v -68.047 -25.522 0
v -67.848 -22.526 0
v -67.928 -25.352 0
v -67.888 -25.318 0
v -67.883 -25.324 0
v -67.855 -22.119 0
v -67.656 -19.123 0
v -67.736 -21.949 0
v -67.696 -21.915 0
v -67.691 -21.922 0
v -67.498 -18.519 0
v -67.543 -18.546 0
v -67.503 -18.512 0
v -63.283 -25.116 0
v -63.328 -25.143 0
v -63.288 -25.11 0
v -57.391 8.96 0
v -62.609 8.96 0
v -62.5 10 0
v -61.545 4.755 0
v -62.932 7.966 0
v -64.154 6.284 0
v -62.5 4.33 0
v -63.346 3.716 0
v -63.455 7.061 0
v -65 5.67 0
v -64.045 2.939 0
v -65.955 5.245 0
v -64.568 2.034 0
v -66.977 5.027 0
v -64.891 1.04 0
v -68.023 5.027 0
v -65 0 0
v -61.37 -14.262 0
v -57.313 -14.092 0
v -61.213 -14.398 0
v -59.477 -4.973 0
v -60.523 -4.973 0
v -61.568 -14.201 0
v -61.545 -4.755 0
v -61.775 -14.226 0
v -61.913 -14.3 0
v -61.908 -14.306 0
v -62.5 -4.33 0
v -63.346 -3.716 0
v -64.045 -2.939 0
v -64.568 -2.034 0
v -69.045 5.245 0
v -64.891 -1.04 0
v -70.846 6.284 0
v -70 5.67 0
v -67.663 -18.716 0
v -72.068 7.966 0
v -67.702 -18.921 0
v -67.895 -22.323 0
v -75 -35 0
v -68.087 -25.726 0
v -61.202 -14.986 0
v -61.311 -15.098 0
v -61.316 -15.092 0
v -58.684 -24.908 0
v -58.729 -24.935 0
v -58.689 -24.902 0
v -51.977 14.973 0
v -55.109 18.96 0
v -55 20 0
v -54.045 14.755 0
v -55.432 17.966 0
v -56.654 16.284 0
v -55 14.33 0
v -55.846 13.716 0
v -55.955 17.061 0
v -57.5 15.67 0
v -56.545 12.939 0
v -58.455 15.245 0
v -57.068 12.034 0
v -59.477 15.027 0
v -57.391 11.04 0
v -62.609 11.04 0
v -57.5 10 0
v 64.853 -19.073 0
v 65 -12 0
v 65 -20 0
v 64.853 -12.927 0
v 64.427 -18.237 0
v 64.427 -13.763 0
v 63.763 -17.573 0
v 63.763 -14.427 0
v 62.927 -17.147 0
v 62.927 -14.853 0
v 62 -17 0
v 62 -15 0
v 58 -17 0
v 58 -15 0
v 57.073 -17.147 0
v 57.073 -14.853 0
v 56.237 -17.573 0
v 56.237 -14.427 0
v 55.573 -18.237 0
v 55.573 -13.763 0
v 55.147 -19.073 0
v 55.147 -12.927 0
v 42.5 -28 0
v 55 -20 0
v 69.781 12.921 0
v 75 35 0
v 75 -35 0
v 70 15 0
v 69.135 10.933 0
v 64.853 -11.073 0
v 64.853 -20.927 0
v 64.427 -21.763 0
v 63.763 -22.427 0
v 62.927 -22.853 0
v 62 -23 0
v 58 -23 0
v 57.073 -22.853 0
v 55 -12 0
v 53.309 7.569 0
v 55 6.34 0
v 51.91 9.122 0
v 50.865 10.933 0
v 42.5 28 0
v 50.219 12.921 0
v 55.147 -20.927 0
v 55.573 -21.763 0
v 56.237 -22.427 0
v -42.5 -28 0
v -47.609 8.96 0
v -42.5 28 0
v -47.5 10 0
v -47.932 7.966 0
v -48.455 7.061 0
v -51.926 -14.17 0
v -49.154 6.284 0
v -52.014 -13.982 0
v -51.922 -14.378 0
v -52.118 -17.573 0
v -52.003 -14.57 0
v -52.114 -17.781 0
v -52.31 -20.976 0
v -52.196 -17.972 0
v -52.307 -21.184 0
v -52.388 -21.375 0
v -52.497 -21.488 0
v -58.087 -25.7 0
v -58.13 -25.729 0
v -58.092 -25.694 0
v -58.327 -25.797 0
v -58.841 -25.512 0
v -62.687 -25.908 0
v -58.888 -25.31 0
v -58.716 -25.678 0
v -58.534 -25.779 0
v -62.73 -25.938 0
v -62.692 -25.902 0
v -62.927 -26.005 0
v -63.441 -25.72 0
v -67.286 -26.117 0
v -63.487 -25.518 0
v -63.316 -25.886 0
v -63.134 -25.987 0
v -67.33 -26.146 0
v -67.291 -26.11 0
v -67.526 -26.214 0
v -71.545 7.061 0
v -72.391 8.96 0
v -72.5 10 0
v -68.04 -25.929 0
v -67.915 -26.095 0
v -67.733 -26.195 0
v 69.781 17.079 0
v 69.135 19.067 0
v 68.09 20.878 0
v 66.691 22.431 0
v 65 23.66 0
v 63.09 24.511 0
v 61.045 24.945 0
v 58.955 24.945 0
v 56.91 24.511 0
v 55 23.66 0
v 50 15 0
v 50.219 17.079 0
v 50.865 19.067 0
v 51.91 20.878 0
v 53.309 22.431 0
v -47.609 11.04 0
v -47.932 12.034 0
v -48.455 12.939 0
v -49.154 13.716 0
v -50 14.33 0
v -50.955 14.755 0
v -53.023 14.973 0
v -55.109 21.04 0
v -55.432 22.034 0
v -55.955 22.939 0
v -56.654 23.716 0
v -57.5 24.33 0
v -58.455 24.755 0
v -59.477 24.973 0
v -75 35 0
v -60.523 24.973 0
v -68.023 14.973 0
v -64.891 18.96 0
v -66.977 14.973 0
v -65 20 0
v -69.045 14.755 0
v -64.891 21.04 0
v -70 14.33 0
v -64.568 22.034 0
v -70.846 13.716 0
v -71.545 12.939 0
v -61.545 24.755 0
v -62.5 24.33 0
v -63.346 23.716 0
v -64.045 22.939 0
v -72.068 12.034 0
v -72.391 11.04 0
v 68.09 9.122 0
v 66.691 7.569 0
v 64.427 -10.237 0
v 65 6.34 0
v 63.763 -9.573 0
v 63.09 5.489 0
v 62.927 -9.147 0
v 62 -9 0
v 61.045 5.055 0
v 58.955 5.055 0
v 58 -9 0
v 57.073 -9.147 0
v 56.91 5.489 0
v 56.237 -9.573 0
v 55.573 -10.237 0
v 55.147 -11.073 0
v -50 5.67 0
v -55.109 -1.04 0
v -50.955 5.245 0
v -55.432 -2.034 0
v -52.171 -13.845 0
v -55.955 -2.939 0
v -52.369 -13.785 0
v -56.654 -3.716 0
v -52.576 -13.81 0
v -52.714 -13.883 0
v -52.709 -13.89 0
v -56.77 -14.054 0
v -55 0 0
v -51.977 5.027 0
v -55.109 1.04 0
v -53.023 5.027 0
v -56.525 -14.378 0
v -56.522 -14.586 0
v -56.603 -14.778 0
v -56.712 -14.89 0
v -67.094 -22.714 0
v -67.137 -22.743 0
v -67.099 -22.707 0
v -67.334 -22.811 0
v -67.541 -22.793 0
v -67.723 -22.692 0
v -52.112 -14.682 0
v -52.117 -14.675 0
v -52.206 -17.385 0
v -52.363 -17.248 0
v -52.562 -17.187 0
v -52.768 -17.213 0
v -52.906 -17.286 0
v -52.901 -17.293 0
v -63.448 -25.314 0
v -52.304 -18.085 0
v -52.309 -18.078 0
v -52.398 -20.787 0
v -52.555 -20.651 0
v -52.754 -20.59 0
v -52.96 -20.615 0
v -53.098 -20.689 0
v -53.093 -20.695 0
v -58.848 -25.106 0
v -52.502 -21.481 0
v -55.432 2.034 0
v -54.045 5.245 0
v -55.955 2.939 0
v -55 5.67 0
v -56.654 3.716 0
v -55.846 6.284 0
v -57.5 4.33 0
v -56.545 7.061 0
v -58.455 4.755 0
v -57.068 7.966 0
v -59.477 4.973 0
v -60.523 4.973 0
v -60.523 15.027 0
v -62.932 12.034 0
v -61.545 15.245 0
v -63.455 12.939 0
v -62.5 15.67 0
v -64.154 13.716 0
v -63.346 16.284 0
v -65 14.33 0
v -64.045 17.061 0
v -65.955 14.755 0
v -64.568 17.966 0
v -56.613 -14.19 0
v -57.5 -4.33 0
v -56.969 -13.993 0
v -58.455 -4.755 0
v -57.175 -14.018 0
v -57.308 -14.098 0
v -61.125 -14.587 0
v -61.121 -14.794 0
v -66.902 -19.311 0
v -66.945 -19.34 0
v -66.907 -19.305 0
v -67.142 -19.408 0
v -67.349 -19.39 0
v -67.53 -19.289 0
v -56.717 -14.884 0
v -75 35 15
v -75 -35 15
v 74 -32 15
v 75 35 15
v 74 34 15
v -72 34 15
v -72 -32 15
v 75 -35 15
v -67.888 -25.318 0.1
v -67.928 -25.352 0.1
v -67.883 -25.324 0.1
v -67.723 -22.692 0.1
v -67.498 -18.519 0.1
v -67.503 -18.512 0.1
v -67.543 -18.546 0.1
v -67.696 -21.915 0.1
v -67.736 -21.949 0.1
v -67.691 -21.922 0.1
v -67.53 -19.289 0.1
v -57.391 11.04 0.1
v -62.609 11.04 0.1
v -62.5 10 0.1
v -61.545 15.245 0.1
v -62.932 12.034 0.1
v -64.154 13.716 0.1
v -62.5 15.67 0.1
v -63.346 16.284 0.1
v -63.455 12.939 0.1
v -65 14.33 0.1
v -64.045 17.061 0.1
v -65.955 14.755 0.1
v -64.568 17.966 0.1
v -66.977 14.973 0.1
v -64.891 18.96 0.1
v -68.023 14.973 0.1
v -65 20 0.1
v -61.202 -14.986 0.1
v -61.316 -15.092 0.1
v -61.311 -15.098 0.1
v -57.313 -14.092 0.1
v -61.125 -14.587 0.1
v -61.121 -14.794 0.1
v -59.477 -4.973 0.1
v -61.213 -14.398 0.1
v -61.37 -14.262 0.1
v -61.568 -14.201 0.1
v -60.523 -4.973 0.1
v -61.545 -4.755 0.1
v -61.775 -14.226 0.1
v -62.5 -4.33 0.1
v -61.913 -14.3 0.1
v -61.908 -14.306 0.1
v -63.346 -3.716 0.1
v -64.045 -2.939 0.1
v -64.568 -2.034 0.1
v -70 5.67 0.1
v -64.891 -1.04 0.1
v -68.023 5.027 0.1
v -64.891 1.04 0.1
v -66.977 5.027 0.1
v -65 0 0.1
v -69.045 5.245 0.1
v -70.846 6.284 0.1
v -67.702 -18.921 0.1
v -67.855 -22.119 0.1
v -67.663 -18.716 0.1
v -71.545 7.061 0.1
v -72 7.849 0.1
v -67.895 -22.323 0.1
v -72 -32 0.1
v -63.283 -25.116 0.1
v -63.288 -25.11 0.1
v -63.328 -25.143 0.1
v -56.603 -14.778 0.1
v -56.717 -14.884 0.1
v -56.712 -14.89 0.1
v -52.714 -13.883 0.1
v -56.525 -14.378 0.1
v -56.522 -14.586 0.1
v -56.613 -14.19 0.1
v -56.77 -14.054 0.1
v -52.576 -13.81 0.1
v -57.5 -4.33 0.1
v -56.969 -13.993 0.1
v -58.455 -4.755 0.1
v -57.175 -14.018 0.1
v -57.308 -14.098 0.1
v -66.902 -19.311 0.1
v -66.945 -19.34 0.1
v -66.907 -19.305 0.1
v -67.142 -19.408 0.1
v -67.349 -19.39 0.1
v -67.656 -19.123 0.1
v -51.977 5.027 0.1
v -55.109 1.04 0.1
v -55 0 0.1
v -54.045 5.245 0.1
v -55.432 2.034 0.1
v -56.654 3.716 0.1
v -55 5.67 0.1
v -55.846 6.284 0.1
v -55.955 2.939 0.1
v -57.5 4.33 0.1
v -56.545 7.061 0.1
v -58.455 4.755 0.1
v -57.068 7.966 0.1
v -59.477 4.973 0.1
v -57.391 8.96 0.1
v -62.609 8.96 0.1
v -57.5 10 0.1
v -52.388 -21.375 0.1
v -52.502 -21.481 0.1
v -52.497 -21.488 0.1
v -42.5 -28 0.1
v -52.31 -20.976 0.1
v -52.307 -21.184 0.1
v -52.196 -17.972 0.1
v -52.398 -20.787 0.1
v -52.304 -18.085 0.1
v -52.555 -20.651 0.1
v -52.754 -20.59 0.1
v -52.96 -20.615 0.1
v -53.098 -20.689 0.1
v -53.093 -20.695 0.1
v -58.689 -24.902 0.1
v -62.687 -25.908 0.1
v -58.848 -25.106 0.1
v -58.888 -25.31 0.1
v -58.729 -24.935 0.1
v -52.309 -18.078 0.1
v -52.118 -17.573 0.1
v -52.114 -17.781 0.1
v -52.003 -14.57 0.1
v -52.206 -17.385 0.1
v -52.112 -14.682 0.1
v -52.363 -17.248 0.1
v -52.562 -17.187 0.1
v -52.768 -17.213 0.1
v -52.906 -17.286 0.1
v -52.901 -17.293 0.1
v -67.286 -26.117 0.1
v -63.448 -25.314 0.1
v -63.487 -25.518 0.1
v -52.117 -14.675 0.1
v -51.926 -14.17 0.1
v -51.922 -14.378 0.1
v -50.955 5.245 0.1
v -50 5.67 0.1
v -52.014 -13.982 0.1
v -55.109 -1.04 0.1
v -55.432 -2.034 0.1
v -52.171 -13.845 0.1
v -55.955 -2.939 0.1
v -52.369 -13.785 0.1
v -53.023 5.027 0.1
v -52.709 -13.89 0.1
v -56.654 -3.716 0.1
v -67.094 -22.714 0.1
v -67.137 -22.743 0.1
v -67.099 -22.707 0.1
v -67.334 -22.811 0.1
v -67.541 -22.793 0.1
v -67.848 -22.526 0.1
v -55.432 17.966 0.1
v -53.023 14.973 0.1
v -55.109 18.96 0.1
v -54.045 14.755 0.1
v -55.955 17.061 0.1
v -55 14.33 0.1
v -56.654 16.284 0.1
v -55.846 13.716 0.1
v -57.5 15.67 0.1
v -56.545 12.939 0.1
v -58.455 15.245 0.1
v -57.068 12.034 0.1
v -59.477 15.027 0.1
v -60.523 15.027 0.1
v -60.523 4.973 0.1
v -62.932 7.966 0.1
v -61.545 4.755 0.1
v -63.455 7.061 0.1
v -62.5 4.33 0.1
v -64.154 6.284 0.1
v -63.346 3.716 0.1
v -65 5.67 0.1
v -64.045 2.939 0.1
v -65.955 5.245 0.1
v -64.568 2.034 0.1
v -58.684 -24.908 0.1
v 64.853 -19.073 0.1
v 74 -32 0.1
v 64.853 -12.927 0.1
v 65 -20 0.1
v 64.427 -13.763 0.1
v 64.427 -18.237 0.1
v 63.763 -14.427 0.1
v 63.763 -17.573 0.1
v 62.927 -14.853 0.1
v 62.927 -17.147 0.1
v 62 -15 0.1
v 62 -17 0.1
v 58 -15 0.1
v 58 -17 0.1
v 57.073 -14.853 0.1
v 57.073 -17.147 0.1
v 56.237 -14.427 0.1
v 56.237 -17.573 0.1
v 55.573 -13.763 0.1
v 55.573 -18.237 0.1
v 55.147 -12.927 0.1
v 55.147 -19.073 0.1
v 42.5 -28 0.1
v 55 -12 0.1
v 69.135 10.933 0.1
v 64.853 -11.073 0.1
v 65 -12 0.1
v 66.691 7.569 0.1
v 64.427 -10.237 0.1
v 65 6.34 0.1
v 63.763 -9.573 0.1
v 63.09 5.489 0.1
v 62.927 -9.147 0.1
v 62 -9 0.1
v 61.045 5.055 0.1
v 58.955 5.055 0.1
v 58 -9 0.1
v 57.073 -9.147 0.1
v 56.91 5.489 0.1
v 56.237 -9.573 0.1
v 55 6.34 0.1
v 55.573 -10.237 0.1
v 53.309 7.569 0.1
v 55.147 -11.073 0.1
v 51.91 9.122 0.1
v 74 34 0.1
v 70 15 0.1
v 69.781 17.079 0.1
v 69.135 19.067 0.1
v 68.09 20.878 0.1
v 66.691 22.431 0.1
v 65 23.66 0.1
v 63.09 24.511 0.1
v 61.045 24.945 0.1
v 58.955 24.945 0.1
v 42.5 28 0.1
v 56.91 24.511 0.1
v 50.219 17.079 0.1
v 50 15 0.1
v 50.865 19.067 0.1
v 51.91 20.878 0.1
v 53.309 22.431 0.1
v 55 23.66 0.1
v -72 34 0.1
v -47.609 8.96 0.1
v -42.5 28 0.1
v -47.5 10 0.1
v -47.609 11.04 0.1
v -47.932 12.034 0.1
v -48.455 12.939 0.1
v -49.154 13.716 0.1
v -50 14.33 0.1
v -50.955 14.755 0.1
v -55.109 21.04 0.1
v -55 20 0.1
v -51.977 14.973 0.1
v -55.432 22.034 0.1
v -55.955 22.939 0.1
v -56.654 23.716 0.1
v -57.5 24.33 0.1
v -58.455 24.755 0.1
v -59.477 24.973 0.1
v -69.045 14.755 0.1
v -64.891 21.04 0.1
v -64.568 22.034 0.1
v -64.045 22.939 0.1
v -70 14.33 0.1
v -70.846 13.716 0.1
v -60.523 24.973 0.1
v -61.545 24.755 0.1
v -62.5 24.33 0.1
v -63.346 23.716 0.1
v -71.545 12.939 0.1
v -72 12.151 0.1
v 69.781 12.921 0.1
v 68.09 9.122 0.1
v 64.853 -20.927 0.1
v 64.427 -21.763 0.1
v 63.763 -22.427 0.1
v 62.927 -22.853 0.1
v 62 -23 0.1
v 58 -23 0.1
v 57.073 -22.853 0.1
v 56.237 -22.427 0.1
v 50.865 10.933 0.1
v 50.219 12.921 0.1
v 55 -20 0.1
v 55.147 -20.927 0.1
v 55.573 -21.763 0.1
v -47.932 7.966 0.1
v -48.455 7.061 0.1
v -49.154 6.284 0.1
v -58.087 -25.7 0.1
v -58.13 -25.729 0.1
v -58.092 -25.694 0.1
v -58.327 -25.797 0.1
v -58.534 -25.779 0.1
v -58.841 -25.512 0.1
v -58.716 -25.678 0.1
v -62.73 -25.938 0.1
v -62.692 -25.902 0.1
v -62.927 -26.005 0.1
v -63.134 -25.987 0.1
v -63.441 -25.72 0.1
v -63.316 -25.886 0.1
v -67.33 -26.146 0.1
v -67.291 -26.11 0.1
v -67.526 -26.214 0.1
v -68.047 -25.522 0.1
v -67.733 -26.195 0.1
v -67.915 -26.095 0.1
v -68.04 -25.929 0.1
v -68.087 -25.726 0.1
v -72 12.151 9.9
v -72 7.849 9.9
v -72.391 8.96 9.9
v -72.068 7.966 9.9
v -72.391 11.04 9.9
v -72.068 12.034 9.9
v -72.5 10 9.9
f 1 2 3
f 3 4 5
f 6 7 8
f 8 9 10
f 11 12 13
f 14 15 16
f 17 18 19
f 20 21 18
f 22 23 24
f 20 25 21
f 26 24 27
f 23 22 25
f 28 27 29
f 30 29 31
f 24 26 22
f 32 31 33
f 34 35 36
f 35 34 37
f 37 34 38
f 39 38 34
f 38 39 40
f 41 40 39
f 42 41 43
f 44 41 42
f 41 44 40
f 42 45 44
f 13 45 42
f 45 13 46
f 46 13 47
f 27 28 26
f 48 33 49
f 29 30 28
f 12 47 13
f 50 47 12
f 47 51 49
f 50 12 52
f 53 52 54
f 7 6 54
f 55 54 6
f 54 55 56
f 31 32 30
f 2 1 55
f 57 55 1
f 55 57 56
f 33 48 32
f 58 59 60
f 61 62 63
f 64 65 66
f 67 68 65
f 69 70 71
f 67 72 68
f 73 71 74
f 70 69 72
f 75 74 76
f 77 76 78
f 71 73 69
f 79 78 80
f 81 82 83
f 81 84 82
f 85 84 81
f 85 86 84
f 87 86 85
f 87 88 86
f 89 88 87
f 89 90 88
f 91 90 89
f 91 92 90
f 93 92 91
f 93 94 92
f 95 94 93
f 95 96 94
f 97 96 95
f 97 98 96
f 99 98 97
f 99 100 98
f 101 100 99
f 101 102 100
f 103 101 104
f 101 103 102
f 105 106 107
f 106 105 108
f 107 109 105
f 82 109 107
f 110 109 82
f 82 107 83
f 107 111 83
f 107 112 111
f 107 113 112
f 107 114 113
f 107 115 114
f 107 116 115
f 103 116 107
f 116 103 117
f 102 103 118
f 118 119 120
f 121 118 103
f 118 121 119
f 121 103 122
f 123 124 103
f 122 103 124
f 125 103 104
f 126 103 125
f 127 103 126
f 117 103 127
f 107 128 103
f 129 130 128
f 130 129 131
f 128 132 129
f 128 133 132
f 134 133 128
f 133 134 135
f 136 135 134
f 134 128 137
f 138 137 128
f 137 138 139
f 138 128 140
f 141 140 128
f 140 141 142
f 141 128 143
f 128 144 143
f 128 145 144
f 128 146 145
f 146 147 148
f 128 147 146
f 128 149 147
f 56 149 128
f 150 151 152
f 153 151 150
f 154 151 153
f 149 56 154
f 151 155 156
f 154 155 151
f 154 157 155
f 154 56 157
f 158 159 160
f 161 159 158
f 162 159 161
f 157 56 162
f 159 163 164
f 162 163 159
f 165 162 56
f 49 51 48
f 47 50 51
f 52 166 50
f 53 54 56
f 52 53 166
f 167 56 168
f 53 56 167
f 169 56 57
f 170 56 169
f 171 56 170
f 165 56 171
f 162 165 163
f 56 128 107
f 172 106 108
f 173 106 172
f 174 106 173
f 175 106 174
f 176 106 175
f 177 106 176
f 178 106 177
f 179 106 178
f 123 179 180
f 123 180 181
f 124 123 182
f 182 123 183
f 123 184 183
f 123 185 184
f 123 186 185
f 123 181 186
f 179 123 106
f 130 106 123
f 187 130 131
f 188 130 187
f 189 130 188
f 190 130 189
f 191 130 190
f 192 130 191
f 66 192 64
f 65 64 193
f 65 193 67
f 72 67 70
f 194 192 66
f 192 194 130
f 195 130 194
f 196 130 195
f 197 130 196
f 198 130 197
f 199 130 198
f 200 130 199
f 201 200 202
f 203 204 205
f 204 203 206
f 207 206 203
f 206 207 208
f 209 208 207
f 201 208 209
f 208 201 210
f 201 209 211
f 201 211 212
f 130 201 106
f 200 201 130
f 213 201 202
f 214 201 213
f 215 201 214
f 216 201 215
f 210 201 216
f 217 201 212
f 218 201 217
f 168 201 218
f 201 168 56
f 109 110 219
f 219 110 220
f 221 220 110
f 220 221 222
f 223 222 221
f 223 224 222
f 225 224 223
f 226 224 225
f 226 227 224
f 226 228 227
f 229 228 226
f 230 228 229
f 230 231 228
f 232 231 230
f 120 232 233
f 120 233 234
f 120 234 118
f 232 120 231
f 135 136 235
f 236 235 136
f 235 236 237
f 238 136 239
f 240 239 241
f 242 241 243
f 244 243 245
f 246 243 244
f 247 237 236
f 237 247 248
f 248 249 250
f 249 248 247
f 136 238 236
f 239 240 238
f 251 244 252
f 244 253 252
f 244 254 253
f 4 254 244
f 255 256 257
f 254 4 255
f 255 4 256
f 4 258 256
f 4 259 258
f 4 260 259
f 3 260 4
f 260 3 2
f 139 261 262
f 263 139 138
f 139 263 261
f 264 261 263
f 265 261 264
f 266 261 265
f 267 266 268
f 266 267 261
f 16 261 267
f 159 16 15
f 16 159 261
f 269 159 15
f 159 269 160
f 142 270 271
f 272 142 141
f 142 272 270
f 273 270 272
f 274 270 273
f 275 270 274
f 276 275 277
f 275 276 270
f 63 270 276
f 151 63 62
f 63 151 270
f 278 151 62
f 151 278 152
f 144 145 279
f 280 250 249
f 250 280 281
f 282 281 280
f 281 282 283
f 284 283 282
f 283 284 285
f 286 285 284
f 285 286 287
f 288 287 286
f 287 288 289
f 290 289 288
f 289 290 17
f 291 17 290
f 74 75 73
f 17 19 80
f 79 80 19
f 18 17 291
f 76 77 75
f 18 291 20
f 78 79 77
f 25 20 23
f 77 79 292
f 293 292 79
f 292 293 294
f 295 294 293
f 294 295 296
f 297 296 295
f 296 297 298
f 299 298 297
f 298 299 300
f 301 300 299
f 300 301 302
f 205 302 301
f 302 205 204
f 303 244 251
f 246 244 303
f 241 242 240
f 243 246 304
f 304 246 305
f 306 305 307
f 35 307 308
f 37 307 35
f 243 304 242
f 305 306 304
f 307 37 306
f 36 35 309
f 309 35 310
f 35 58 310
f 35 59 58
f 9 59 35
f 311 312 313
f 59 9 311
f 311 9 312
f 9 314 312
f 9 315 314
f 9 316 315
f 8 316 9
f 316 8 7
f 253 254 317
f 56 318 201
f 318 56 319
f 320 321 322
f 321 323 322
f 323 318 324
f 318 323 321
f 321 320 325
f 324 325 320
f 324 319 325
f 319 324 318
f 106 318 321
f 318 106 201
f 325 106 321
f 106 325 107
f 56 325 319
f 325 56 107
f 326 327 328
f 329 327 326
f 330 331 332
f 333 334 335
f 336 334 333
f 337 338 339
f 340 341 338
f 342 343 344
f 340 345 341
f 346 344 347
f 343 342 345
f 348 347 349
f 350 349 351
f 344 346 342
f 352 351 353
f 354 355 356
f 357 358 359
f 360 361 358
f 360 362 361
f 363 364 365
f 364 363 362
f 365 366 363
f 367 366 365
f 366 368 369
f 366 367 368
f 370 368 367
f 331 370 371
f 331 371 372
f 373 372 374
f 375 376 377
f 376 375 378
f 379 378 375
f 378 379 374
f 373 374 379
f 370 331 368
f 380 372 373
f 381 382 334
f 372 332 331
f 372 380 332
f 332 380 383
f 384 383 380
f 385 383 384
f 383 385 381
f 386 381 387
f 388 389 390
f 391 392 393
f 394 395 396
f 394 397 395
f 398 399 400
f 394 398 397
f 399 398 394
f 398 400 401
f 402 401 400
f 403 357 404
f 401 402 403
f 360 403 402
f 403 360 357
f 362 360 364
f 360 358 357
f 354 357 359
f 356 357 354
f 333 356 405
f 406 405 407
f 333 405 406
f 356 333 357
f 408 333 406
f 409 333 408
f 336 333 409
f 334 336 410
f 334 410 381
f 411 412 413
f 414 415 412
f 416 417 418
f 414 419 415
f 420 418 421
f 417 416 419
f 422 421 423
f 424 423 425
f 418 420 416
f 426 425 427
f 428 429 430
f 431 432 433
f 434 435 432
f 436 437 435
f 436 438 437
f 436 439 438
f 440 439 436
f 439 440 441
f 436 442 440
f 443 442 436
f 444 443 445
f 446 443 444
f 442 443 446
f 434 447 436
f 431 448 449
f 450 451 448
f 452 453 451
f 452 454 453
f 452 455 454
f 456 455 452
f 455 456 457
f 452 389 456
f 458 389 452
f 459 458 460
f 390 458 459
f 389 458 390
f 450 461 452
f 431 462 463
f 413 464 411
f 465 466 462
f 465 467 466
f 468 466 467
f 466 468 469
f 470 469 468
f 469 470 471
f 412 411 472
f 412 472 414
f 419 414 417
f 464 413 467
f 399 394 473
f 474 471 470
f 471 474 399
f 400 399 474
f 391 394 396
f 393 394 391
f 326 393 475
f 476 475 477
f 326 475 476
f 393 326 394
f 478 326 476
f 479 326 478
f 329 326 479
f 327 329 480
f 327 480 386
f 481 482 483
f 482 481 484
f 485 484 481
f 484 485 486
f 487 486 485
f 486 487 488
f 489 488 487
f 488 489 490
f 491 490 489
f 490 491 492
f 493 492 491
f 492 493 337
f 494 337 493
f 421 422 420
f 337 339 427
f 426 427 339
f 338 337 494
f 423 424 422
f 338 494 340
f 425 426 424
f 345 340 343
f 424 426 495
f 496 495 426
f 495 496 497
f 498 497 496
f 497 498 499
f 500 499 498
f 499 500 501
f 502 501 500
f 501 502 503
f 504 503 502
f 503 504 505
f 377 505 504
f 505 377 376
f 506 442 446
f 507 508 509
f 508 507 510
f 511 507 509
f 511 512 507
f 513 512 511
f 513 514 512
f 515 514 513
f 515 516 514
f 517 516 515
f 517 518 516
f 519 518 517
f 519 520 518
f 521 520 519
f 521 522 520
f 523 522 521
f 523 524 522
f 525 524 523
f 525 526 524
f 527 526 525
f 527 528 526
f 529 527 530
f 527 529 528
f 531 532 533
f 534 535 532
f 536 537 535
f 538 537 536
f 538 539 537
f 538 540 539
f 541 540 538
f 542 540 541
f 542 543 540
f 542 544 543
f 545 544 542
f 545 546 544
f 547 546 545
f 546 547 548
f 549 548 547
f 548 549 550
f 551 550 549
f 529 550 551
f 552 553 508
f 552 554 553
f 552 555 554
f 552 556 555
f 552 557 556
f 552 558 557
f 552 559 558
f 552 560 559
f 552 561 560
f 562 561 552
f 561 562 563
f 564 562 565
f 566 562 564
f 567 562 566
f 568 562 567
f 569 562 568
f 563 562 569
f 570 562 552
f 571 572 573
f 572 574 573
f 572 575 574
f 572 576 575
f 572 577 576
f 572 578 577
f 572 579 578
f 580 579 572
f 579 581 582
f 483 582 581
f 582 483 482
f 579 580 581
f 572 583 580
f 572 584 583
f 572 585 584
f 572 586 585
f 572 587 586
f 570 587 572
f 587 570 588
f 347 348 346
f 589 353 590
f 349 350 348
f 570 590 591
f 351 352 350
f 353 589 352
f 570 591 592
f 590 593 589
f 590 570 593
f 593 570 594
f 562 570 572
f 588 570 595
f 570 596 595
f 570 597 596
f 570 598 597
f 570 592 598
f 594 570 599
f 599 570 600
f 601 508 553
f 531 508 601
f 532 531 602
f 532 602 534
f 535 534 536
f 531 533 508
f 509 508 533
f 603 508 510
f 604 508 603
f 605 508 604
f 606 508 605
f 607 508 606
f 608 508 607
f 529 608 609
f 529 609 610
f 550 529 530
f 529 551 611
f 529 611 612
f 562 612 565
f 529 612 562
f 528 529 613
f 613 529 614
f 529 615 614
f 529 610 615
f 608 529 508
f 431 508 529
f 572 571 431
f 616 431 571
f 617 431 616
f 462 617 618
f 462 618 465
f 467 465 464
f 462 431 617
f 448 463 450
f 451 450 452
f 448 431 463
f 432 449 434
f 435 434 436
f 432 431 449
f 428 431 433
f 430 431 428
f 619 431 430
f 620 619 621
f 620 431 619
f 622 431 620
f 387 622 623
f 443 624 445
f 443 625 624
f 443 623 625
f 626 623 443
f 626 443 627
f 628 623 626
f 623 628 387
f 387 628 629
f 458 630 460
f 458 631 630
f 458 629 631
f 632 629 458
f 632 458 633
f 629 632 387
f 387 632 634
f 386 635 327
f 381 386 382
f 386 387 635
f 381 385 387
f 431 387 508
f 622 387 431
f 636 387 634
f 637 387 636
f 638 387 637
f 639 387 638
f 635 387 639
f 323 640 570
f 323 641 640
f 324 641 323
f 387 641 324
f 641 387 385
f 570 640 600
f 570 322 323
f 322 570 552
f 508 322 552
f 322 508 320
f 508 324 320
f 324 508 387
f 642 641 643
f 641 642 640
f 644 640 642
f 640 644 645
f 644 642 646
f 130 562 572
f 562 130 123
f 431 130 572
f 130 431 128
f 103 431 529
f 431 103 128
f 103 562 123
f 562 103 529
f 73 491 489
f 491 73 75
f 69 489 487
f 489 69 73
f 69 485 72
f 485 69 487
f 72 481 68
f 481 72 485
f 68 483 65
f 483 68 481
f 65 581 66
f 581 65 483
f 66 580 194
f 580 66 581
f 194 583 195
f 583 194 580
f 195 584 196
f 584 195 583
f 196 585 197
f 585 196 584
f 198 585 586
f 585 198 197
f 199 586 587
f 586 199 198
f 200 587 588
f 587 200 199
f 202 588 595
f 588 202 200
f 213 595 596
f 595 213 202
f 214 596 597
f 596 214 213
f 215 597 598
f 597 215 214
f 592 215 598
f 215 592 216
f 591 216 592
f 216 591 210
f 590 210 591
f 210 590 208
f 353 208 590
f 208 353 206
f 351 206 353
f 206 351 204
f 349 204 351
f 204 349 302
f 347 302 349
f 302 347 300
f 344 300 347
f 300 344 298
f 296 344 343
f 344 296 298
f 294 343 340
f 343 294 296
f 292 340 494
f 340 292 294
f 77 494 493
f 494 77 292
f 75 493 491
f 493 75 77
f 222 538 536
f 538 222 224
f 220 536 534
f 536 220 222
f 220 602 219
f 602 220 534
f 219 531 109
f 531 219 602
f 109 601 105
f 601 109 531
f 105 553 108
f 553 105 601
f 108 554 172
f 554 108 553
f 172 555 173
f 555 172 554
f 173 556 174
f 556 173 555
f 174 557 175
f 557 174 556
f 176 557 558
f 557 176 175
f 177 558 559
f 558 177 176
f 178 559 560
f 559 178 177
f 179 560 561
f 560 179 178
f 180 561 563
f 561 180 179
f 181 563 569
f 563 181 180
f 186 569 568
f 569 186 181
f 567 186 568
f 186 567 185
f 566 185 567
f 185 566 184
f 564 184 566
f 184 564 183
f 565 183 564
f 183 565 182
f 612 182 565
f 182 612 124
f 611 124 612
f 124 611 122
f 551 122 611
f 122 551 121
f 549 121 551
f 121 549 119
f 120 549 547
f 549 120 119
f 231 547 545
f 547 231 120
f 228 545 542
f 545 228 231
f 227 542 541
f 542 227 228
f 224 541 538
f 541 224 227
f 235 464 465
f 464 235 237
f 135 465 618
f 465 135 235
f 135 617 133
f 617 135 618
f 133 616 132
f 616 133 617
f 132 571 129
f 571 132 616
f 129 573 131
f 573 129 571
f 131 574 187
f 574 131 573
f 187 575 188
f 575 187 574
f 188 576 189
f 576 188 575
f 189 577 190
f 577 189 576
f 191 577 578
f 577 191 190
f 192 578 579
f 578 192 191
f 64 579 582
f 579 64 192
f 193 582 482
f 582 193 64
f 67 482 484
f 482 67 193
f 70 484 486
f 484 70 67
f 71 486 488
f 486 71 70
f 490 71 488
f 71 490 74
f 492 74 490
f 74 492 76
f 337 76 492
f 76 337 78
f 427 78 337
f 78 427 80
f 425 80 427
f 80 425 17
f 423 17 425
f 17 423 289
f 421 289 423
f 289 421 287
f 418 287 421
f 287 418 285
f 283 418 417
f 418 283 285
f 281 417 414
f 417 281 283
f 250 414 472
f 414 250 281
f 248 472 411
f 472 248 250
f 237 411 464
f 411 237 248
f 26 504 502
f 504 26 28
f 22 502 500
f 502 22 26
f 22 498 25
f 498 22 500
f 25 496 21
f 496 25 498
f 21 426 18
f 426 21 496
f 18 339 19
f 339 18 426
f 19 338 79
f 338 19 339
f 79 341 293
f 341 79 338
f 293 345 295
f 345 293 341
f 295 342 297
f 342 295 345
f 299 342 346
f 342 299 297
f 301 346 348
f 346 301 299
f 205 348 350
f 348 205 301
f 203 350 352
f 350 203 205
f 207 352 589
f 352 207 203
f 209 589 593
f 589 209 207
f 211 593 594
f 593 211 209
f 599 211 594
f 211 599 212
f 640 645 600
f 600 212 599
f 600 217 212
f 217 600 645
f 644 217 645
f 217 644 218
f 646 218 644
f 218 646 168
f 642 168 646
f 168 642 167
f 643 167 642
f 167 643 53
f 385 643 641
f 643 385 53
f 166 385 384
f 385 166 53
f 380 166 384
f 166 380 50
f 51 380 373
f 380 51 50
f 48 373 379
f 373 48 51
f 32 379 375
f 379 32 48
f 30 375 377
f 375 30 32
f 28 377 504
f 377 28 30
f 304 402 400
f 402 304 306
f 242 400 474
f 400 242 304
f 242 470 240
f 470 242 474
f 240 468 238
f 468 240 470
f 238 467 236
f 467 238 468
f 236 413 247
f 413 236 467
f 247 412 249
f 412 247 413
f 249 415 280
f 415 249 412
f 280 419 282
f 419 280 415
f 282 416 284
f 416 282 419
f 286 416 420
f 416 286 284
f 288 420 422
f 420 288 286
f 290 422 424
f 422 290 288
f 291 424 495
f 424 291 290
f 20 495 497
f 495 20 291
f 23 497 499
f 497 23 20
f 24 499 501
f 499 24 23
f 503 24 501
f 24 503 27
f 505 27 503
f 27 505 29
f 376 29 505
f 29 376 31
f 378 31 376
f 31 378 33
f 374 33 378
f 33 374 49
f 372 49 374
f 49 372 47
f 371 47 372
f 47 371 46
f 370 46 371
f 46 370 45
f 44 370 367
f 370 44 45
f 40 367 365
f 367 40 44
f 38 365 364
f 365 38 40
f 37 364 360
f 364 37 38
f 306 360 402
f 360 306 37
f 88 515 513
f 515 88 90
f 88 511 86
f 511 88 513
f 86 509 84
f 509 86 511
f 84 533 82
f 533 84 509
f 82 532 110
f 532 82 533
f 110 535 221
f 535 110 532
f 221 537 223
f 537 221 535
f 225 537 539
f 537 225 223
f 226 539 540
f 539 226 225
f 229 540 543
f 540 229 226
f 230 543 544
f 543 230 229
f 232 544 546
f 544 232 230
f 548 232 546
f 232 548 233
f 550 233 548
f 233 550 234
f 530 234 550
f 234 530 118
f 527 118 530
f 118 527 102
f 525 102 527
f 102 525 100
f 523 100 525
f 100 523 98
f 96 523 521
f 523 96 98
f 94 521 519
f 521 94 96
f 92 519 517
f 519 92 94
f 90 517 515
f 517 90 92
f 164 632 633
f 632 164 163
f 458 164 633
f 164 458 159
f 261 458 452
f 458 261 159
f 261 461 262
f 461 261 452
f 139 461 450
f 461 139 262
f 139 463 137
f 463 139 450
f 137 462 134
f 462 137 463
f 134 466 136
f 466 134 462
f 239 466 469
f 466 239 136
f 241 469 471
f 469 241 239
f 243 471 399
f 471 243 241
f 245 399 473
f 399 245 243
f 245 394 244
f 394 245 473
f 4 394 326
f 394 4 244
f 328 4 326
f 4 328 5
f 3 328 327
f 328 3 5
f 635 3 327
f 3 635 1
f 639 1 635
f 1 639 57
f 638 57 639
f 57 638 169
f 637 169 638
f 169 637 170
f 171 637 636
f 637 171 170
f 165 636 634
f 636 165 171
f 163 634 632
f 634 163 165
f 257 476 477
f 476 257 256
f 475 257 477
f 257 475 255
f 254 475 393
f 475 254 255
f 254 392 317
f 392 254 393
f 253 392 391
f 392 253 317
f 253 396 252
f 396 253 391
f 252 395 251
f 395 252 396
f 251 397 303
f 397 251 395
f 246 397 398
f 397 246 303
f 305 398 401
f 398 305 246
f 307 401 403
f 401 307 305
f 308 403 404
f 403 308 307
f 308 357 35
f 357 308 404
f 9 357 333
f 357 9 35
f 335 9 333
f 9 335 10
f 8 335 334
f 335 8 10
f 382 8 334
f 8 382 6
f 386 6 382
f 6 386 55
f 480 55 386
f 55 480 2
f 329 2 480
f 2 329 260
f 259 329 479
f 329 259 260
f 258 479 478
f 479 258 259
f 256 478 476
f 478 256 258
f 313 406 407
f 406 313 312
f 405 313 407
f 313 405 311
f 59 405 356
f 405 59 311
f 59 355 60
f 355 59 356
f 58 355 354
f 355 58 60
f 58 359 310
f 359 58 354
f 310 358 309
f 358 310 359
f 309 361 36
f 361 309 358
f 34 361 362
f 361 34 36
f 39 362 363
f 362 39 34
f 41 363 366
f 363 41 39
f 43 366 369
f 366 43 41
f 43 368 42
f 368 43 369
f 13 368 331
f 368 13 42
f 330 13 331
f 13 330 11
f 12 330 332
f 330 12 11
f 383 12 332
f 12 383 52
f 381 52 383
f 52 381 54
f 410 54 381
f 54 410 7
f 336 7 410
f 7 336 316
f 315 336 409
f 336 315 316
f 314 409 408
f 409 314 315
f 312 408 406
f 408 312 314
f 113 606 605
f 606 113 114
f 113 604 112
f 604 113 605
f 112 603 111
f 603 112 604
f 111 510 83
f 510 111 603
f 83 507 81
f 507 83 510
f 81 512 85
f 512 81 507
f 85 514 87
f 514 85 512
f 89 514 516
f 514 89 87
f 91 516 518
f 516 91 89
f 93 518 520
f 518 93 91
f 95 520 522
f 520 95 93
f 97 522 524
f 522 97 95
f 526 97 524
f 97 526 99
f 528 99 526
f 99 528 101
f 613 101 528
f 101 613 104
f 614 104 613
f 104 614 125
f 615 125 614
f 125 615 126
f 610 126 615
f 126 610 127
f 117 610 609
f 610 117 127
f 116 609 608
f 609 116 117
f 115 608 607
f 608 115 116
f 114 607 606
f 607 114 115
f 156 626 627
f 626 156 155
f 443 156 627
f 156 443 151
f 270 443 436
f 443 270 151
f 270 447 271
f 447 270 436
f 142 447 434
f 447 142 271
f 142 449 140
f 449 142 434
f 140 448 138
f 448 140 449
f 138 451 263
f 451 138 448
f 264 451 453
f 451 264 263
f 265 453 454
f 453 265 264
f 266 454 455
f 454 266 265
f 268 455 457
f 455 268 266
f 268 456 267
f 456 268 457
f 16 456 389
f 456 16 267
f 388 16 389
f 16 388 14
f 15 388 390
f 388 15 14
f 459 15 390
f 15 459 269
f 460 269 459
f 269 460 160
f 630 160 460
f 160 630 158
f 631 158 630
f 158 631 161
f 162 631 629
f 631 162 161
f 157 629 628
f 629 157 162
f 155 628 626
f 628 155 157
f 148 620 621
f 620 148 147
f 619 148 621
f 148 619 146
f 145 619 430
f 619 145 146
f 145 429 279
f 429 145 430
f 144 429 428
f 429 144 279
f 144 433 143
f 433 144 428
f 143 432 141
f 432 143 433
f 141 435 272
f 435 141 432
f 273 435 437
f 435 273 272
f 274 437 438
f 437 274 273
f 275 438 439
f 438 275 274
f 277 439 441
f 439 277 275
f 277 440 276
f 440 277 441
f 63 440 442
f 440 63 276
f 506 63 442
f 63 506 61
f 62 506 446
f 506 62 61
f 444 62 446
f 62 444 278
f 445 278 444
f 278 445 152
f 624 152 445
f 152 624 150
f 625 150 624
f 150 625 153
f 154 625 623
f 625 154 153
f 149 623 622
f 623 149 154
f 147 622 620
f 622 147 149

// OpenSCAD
// import("file.svg");

frontShell();

module frontShell() {
    difference() {
        frontShellWithoutHoles();
        frontHoles();
    }
}



module frontShellWithoutHoles() {
    difference() {
        union(){
            linear_extrude(15){
                translate([0, 0, 0]) {
                    square(size=[150, 70], center=true);
                }
            }
        }
        v = 2; 
        union(){
            translate([v/2, v/2, 0.1]) {
            linear_extrude(15){
                    square(size=[150-v*2, 70-v*2], center=true);
                }
            }
        }
    }
}

module frontHoles() {
    translate([0, 0, -0.1]) {
        linear_extrude(10){
            color([0/255, 0/255, 0/255]) {
                dpadHole(60,15);
                ssButtonHole(60,-20);
                gameButtonHole(-60,10);
                speakerHoles(-60,-20);
                screenHole();
            }
        }
    }
}

module hsLogo(x,y) {
    translate([x, y, 0]) {
        linear_extrude(height=10, center=true, convexity=10, twist=0) {
        import("Icon_green_transparent.svg");
        }
    }
}

module dpadHole(xPos,yPos) {
    d = 20;    //not acurate number 
    
    translate([xPos, yPos, 0]) {
        circle(r=d/2);
    }
}

module ssButtonHole(x,y) {

    x = x-2; //just to prettify. is bad code.

    d=6;  //depth
    w=10;  //heigth

    xDist = 0; // dist between buttons.
    yDist = 8;

    translate([x, y, 0]) {
        union(){
            circle(r=d/2, $fn=20);
            translate([w-d, 0, 0]) {
                circle(r=d/2, $fn=20);
            }
            translate([w/2 - d/2, 0, 0]) {
                square(size=[w-d, d], center=true);
            }
        }
    }
    translate([x+xDist, y+yDist, 0]) {
        union(){
            circle(r=d/2, $fn=20);
            translate([w-d, 0, 0]) {
                circle(r=d/2, $fn=20);
            }
            translate([w/2 - d/2, 0, 0]) {
                square(size=[w-d, d], center=true);
            }
        }
    }



}

module speakerHoles(xPos,yPos) {

    d=1; //diameter of lines
    l = 20; //mex length of diagonale in lines
    r = 37; //positive verdier.

    
    translate([xPos, yPos, 0]) {

        rotate([0, 0, r]) {
            union(){
                
                speakerHOleLine(d,l);
                //not geometrically parametric
                per = 0.7;
                translate([-cos(r), sin(r)+2*d, 0]) 
                    speakerHOleLine(d,l*per);
                translate([+cos(r), -sin(r)-2*d, 0]) 
                    speakerHOleLine(d,l*per);
                per2 = 0.4;
                translate([-2*cos(r), 2*sin(r)+4*d, 0]) 
                    speakerHOleLine(d,l*per2);
                translate([2*cos(r), -2*sin(r)-4*d, 0]) 
                    speakerHOleLine(d,l*per2);
                

            }
        }
    }
}
module speakerHOleLine(d,l) {
        union(){
            translate([(-l+d)/2, 0, 0]) {
            circle(r=d/2, $fn=15);
            }
            translate([(l-d)/2, 0, 0]) {
                circle(r=d/2, $fn=15);
            }
            square(size=[l-d, d], center=true);
        }
    
}



module gameButtonHole(xPos,yPos) {
    d = 10;     //not acurate number //diameter

    xDist = 15;  //not acurate number
    yDist = 20;  //not acurate number

    res = 30; //resolution of circle (polygon count)

    // translate([xPos, yPos, 0]) {
    //     circle(r=2); //centre pos
    // }
    translate([xPos+xDist/2, yPos, 0]) {
        circle(r=d/2 , $fn=res); //a
    }
    translate([xPos-xDist/2, yPos, 0]) {
        circle(r=d/2 , $fn=res); //y
    }
    translate([xPos, yPos+yDist/2, 0]) {
        circle(r=d/2 , $fn=res); //x
    }
    translate([xPos, yPos-yDist/2, 0]) {
        circle(r=d/2 , $fn=res); //b
    }
}

module screenHole() {
    wScreen = 85;
    hScreen = 56;
    //skjerm
    square(size=[wScreen, hScreen], center=true);
}
